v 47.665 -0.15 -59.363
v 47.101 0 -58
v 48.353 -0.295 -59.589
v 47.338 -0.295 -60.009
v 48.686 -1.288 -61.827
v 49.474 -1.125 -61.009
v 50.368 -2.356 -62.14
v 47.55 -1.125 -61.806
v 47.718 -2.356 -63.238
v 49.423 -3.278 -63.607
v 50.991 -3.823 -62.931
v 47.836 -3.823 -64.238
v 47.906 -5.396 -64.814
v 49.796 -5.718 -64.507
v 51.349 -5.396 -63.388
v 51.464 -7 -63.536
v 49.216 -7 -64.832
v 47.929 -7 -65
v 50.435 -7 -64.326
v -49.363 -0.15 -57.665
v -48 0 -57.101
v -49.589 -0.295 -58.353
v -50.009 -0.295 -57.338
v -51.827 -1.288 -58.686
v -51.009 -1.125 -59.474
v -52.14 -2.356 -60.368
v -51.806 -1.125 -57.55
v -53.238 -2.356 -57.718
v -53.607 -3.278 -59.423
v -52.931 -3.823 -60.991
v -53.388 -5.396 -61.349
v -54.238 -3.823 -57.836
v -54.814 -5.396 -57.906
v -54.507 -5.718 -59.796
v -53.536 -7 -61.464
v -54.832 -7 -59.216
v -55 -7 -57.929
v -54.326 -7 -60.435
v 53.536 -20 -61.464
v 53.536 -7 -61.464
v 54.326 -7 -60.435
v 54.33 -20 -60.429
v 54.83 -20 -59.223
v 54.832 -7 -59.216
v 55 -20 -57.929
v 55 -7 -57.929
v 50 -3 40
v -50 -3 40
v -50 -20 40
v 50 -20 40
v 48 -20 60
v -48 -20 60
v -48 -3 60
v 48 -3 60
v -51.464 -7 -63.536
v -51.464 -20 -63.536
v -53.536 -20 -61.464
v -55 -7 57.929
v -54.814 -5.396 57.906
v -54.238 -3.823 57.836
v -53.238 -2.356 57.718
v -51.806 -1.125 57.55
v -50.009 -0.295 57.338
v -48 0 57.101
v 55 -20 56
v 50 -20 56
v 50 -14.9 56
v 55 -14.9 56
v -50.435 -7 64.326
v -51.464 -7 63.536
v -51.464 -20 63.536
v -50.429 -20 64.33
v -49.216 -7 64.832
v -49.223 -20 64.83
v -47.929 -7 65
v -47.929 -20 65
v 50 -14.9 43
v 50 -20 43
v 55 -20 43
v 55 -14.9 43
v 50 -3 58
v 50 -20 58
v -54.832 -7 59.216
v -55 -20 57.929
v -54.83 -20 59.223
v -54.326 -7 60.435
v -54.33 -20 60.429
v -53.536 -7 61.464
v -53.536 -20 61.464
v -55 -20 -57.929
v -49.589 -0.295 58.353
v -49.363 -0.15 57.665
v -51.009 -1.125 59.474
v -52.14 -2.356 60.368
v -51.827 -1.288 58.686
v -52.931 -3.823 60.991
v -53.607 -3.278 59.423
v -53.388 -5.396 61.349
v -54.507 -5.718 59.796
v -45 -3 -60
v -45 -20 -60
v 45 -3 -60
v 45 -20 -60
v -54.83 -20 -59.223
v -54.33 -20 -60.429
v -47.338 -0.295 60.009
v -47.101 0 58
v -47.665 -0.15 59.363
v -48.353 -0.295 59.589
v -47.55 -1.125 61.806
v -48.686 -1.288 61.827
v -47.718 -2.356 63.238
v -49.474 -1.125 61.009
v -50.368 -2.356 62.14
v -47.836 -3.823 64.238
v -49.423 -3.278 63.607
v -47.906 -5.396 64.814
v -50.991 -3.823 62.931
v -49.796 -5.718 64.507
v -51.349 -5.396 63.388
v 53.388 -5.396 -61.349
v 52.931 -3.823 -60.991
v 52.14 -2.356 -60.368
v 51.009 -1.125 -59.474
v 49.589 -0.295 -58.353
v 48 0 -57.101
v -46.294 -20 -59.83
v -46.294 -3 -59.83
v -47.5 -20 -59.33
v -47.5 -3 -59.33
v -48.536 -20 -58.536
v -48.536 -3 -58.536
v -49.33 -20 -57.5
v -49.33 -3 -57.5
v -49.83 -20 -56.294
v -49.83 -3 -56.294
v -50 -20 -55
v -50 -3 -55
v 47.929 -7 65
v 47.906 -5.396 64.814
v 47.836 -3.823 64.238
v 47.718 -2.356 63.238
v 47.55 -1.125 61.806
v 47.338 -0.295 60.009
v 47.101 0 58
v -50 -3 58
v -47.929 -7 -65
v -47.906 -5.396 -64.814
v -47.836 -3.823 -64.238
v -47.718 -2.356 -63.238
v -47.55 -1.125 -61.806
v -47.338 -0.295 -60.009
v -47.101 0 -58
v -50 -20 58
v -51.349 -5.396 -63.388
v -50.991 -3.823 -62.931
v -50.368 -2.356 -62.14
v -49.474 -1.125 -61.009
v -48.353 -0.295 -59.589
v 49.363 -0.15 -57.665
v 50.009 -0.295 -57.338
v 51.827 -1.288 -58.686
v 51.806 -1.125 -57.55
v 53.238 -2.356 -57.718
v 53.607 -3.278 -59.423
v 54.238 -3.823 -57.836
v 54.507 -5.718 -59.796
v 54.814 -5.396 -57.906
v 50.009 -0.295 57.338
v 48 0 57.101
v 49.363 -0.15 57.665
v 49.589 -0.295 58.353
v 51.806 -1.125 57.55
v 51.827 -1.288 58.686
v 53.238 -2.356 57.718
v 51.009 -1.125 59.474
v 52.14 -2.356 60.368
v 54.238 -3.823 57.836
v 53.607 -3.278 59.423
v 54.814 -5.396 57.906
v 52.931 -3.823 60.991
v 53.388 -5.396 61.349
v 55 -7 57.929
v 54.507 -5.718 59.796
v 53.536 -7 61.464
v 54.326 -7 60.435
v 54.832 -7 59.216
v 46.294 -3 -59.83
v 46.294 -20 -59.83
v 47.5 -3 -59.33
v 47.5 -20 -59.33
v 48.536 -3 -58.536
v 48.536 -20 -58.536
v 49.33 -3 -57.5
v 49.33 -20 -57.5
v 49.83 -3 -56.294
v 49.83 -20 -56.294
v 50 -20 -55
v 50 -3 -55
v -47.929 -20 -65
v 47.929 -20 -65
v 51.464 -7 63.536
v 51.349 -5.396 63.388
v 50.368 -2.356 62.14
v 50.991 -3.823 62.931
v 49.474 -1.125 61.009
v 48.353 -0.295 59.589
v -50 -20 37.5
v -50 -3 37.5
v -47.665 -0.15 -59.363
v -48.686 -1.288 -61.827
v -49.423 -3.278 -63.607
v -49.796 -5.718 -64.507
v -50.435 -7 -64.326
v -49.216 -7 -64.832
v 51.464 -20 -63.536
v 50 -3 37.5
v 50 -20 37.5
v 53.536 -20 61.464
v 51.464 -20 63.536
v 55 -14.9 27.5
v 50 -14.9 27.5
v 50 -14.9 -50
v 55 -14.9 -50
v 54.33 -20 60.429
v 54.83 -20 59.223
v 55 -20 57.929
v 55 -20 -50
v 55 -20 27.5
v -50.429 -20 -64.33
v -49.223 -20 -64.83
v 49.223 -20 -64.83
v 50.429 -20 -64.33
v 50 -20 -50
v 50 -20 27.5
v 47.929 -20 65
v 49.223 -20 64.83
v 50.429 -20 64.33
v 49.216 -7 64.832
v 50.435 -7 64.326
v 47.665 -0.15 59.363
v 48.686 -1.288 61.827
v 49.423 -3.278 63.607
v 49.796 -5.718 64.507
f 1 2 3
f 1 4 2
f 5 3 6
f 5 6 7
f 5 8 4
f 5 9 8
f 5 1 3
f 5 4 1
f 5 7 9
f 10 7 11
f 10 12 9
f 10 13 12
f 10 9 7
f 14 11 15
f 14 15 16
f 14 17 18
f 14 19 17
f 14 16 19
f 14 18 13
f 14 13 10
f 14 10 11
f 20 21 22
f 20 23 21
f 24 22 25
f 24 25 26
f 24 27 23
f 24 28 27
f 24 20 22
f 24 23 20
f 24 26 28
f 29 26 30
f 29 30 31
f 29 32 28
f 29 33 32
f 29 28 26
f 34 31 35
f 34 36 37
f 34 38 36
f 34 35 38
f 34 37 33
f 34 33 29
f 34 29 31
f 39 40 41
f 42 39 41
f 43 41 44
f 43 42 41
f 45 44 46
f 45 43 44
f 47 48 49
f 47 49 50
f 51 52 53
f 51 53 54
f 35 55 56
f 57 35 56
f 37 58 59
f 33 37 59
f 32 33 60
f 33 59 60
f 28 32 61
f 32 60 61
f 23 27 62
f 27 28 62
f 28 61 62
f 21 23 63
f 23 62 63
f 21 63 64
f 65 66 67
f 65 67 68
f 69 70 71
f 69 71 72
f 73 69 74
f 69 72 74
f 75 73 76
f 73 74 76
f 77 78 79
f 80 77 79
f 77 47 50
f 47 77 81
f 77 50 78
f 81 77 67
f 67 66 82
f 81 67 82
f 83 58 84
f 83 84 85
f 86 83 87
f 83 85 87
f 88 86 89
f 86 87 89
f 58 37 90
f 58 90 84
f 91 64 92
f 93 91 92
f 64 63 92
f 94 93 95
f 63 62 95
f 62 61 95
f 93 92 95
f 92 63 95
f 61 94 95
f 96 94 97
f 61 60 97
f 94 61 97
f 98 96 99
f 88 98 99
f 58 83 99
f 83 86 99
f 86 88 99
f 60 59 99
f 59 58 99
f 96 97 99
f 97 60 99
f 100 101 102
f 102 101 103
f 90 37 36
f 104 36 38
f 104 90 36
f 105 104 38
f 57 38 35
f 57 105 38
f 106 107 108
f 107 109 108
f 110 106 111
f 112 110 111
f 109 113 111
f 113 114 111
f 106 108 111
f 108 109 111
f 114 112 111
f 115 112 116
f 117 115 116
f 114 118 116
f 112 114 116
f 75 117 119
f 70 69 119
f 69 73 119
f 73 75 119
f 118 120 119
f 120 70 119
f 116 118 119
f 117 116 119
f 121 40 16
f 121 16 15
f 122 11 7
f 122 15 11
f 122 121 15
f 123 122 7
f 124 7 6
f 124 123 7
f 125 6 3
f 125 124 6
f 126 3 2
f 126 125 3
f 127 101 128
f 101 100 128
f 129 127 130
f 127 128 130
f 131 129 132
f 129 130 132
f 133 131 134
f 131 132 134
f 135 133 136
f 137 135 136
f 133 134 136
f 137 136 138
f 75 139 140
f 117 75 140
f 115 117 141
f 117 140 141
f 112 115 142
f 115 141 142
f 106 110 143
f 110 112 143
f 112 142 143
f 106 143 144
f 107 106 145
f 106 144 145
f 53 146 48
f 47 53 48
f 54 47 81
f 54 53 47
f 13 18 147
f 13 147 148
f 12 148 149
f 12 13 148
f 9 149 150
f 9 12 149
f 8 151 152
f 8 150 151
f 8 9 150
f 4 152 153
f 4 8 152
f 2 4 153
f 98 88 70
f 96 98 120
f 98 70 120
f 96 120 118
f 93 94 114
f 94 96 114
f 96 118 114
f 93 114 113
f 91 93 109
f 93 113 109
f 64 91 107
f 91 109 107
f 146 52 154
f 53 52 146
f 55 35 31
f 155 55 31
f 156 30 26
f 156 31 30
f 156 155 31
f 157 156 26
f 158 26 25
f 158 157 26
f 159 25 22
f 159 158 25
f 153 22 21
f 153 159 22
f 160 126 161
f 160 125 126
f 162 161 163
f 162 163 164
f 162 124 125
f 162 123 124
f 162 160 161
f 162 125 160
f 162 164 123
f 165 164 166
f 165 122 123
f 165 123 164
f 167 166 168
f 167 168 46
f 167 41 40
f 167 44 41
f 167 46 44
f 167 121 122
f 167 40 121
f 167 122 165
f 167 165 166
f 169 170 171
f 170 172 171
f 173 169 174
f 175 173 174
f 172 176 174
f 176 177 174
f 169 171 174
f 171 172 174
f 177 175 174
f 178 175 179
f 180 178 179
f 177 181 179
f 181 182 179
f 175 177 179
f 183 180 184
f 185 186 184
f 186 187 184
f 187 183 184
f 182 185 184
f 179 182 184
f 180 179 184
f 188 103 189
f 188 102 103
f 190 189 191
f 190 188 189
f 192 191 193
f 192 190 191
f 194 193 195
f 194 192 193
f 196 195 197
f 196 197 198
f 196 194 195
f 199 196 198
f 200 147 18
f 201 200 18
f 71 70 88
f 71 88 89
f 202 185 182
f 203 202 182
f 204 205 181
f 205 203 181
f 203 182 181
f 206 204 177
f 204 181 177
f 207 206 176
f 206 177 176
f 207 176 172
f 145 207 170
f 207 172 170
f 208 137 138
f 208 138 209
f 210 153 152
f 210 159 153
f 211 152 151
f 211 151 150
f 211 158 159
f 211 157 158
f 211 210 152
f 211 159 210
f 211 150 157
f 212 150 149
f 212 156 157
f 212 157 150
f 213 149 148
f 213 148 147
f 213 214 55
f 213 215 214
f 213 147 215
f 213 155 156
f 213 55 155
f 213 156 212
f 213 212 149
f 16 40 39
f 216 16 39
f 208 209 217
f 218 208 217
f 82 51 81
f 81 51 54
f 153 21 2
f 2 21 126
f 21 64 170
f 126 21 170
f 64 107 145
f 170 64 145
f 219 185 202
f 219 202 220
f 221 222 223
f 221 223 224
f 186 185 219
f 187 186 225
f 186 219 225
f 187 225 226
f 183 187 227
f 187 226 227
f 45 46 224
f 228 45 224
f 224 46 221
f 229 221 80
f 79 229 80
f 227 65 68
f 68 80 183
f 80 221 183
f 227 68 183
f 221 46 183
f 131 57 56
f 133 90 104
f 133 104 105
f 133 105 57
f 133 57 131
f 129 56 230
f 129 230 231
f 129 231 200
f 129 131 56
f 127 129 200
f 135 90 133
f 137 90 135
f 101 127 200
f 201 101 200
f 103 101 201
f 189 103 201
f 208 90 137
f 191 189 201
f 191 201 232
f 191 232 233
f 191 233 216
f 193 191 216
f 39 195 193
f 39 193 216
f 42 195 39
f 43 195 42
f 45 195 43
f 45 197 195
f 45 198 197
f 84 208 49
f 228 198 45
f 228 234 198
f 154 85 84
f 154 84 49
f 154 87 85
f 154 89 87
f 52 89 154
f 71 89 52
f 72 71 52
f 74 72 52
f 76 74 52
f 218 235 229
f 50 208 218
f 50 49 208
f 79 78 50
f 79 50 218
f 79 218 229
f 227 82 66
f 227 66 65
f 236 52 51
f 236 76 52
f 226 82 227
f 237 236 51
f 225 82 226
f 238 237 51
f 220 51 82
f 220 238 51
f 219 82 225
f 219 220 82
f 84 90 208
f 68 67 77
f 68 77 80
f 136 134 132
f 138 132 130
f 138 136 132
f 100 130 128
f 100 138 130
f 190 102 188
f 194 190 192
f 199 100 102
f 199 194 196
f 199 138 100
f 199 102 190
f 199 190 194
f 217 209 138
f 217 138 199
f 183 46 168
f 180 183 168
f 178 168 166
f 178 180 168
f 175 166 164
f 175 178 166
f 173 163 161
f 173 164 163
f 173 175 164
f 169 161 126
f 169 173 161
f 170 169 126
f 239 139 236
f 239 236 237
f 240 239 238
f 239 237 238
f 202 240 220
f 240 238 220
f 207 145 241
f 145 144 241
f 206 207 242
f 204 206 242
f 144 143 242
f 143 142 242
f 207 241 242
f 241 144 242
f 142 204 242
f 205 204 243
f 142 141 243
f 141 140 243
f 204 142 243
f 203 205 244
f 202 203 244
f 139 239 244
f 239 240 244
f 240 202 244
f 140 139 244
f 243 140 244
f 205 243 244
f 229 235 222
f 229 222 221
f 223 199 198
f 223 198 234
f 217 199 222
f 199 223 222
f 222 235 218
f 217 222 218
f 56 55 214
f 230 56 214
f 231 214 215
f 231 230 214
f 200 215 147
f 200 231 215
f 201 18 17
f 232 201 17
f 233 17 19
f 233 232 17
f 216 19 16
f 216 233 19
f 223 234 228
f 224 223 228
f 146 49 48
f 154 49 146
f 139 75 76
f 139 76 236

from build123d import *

# Parameters (mm, degrees)
F0_W      = 110
F0_H      = 130
F1_DEPTH  = 20
F2_W      = 100
F2_H      = 120
F3_DEPTH  = 17
F4_W      = 100
F4_H      = 2.5
F5_DEPTH  = 17
F6_SIZE   = 5
F7_SIZE   = 2
F8_R      = 7
F9_R      = 5
F10_R     = 5
F11_R     = 5
F12_W     = 5
F12_H     = 77.5
F13_DEPTH = 5.1
F14_W     = 5
F14_H     = 13
F15_DEPTH = 5.1


with BuildPart() as f1:
    # F0 (on Front) → F1 (new body)
    with BuildSketch(Plane.XZ):
        Rectangle(F0_W, F0_H)
    extrude(amount=F1_DEPTH)

    # F2 (on face) → F3 (cut)
    with BuildSketch(Plane.XZ.offset(20)):
        Rectangle(F2_W, F2_H)
    extrude(amount=-F3_DEPTH, mode=Mode.SUBTRACT)

    # F4 (on face) → F5 (join, through all)
    with BuildSketch(Plane.XZ.offset(3)):
        with Locations((0, 38.75)):
            Rectangle(F4_W, F4_H)
    extrude(amount=F5_DEPTH)

    # F6
    f6_edges = [f1.edges().sort_by_distance(p)[0] for p in [
        (55, -10, 65),
        (-55, -10, 65),
        (55, -10, -65),
        (-55, -10, -65),
    ]]
    chamfer(f6_edges, length=F6_SIZE)

    # F7
    f7_edges = [f1.edges().sort_by_distance(p)[0] for p in [
        (50, -11.5, 60),
        (-50, -11.5, 60),
    ]]
    chamfer(f7_edges, length=F7_SIZE)

    # F8
    f8_edges = [f1.edges().sort_by_distance(p)[0] for p in [
        (0, 0, -65),
        (-52.5, 0, -62.5),
        (52.5, 0, -62.5),
        (-55, 0, 0),
        (55, 0, 0),
        (-52.5, 0, 62.5),
        (52.5, 0, 62.5),
        (0, 0, 65),
    ]]
    fillet(f8_edges, radius=F8_R)

    # F9
    f9_edges = [f1.edges().sort_by_distance(p)[0] for p in [
        (-55, -13.5, -60),
        (-50, -13.5, -65),
        (55, -13.5, -60),
        (50, -13.5, -65),
        (50, -13.5, 65),
        (55, -13.5, 60),
    ]]
    fillet(f9_edges, radius=F9_R)

    # F10
    f10_edges = [f1.edges().sort_by_distance(p)[0] for p in [
        (-50, -13.5, 65),
        (-55, -13.5, 60),
    ]]
    fillet(f10_edges, radius=F10_R)

    # F11
    f11_edges = [f1.edges().sort_by_distance(p)[0] for p in [
        (-50, -11.5, -60),
        (50, -11.5, -60),
    ]]
    fillet(f11_edges, radius=F11_R)

    # F12 (on face) → F13 (cut)
    with BuildSketch(Plane.XZ.offset(20)):
        with Locations((52.5, -11.25)):
            Rectangle(F12_W, F12_H)
    extrude(amount=-F13_DEPTH, mode=Mode.SUBTRACT)

    # F14 (on face) → F15 (cut)
    with BuildSketch(Plane.XZ.offset(20)):
        with Locations((52.5, 49.5)):
            Rectangle(F14_W, F14_H)
    extrude(amount=-F15_DEPTH, mode=Mode.SUBTRACT)


solid = f1.part
